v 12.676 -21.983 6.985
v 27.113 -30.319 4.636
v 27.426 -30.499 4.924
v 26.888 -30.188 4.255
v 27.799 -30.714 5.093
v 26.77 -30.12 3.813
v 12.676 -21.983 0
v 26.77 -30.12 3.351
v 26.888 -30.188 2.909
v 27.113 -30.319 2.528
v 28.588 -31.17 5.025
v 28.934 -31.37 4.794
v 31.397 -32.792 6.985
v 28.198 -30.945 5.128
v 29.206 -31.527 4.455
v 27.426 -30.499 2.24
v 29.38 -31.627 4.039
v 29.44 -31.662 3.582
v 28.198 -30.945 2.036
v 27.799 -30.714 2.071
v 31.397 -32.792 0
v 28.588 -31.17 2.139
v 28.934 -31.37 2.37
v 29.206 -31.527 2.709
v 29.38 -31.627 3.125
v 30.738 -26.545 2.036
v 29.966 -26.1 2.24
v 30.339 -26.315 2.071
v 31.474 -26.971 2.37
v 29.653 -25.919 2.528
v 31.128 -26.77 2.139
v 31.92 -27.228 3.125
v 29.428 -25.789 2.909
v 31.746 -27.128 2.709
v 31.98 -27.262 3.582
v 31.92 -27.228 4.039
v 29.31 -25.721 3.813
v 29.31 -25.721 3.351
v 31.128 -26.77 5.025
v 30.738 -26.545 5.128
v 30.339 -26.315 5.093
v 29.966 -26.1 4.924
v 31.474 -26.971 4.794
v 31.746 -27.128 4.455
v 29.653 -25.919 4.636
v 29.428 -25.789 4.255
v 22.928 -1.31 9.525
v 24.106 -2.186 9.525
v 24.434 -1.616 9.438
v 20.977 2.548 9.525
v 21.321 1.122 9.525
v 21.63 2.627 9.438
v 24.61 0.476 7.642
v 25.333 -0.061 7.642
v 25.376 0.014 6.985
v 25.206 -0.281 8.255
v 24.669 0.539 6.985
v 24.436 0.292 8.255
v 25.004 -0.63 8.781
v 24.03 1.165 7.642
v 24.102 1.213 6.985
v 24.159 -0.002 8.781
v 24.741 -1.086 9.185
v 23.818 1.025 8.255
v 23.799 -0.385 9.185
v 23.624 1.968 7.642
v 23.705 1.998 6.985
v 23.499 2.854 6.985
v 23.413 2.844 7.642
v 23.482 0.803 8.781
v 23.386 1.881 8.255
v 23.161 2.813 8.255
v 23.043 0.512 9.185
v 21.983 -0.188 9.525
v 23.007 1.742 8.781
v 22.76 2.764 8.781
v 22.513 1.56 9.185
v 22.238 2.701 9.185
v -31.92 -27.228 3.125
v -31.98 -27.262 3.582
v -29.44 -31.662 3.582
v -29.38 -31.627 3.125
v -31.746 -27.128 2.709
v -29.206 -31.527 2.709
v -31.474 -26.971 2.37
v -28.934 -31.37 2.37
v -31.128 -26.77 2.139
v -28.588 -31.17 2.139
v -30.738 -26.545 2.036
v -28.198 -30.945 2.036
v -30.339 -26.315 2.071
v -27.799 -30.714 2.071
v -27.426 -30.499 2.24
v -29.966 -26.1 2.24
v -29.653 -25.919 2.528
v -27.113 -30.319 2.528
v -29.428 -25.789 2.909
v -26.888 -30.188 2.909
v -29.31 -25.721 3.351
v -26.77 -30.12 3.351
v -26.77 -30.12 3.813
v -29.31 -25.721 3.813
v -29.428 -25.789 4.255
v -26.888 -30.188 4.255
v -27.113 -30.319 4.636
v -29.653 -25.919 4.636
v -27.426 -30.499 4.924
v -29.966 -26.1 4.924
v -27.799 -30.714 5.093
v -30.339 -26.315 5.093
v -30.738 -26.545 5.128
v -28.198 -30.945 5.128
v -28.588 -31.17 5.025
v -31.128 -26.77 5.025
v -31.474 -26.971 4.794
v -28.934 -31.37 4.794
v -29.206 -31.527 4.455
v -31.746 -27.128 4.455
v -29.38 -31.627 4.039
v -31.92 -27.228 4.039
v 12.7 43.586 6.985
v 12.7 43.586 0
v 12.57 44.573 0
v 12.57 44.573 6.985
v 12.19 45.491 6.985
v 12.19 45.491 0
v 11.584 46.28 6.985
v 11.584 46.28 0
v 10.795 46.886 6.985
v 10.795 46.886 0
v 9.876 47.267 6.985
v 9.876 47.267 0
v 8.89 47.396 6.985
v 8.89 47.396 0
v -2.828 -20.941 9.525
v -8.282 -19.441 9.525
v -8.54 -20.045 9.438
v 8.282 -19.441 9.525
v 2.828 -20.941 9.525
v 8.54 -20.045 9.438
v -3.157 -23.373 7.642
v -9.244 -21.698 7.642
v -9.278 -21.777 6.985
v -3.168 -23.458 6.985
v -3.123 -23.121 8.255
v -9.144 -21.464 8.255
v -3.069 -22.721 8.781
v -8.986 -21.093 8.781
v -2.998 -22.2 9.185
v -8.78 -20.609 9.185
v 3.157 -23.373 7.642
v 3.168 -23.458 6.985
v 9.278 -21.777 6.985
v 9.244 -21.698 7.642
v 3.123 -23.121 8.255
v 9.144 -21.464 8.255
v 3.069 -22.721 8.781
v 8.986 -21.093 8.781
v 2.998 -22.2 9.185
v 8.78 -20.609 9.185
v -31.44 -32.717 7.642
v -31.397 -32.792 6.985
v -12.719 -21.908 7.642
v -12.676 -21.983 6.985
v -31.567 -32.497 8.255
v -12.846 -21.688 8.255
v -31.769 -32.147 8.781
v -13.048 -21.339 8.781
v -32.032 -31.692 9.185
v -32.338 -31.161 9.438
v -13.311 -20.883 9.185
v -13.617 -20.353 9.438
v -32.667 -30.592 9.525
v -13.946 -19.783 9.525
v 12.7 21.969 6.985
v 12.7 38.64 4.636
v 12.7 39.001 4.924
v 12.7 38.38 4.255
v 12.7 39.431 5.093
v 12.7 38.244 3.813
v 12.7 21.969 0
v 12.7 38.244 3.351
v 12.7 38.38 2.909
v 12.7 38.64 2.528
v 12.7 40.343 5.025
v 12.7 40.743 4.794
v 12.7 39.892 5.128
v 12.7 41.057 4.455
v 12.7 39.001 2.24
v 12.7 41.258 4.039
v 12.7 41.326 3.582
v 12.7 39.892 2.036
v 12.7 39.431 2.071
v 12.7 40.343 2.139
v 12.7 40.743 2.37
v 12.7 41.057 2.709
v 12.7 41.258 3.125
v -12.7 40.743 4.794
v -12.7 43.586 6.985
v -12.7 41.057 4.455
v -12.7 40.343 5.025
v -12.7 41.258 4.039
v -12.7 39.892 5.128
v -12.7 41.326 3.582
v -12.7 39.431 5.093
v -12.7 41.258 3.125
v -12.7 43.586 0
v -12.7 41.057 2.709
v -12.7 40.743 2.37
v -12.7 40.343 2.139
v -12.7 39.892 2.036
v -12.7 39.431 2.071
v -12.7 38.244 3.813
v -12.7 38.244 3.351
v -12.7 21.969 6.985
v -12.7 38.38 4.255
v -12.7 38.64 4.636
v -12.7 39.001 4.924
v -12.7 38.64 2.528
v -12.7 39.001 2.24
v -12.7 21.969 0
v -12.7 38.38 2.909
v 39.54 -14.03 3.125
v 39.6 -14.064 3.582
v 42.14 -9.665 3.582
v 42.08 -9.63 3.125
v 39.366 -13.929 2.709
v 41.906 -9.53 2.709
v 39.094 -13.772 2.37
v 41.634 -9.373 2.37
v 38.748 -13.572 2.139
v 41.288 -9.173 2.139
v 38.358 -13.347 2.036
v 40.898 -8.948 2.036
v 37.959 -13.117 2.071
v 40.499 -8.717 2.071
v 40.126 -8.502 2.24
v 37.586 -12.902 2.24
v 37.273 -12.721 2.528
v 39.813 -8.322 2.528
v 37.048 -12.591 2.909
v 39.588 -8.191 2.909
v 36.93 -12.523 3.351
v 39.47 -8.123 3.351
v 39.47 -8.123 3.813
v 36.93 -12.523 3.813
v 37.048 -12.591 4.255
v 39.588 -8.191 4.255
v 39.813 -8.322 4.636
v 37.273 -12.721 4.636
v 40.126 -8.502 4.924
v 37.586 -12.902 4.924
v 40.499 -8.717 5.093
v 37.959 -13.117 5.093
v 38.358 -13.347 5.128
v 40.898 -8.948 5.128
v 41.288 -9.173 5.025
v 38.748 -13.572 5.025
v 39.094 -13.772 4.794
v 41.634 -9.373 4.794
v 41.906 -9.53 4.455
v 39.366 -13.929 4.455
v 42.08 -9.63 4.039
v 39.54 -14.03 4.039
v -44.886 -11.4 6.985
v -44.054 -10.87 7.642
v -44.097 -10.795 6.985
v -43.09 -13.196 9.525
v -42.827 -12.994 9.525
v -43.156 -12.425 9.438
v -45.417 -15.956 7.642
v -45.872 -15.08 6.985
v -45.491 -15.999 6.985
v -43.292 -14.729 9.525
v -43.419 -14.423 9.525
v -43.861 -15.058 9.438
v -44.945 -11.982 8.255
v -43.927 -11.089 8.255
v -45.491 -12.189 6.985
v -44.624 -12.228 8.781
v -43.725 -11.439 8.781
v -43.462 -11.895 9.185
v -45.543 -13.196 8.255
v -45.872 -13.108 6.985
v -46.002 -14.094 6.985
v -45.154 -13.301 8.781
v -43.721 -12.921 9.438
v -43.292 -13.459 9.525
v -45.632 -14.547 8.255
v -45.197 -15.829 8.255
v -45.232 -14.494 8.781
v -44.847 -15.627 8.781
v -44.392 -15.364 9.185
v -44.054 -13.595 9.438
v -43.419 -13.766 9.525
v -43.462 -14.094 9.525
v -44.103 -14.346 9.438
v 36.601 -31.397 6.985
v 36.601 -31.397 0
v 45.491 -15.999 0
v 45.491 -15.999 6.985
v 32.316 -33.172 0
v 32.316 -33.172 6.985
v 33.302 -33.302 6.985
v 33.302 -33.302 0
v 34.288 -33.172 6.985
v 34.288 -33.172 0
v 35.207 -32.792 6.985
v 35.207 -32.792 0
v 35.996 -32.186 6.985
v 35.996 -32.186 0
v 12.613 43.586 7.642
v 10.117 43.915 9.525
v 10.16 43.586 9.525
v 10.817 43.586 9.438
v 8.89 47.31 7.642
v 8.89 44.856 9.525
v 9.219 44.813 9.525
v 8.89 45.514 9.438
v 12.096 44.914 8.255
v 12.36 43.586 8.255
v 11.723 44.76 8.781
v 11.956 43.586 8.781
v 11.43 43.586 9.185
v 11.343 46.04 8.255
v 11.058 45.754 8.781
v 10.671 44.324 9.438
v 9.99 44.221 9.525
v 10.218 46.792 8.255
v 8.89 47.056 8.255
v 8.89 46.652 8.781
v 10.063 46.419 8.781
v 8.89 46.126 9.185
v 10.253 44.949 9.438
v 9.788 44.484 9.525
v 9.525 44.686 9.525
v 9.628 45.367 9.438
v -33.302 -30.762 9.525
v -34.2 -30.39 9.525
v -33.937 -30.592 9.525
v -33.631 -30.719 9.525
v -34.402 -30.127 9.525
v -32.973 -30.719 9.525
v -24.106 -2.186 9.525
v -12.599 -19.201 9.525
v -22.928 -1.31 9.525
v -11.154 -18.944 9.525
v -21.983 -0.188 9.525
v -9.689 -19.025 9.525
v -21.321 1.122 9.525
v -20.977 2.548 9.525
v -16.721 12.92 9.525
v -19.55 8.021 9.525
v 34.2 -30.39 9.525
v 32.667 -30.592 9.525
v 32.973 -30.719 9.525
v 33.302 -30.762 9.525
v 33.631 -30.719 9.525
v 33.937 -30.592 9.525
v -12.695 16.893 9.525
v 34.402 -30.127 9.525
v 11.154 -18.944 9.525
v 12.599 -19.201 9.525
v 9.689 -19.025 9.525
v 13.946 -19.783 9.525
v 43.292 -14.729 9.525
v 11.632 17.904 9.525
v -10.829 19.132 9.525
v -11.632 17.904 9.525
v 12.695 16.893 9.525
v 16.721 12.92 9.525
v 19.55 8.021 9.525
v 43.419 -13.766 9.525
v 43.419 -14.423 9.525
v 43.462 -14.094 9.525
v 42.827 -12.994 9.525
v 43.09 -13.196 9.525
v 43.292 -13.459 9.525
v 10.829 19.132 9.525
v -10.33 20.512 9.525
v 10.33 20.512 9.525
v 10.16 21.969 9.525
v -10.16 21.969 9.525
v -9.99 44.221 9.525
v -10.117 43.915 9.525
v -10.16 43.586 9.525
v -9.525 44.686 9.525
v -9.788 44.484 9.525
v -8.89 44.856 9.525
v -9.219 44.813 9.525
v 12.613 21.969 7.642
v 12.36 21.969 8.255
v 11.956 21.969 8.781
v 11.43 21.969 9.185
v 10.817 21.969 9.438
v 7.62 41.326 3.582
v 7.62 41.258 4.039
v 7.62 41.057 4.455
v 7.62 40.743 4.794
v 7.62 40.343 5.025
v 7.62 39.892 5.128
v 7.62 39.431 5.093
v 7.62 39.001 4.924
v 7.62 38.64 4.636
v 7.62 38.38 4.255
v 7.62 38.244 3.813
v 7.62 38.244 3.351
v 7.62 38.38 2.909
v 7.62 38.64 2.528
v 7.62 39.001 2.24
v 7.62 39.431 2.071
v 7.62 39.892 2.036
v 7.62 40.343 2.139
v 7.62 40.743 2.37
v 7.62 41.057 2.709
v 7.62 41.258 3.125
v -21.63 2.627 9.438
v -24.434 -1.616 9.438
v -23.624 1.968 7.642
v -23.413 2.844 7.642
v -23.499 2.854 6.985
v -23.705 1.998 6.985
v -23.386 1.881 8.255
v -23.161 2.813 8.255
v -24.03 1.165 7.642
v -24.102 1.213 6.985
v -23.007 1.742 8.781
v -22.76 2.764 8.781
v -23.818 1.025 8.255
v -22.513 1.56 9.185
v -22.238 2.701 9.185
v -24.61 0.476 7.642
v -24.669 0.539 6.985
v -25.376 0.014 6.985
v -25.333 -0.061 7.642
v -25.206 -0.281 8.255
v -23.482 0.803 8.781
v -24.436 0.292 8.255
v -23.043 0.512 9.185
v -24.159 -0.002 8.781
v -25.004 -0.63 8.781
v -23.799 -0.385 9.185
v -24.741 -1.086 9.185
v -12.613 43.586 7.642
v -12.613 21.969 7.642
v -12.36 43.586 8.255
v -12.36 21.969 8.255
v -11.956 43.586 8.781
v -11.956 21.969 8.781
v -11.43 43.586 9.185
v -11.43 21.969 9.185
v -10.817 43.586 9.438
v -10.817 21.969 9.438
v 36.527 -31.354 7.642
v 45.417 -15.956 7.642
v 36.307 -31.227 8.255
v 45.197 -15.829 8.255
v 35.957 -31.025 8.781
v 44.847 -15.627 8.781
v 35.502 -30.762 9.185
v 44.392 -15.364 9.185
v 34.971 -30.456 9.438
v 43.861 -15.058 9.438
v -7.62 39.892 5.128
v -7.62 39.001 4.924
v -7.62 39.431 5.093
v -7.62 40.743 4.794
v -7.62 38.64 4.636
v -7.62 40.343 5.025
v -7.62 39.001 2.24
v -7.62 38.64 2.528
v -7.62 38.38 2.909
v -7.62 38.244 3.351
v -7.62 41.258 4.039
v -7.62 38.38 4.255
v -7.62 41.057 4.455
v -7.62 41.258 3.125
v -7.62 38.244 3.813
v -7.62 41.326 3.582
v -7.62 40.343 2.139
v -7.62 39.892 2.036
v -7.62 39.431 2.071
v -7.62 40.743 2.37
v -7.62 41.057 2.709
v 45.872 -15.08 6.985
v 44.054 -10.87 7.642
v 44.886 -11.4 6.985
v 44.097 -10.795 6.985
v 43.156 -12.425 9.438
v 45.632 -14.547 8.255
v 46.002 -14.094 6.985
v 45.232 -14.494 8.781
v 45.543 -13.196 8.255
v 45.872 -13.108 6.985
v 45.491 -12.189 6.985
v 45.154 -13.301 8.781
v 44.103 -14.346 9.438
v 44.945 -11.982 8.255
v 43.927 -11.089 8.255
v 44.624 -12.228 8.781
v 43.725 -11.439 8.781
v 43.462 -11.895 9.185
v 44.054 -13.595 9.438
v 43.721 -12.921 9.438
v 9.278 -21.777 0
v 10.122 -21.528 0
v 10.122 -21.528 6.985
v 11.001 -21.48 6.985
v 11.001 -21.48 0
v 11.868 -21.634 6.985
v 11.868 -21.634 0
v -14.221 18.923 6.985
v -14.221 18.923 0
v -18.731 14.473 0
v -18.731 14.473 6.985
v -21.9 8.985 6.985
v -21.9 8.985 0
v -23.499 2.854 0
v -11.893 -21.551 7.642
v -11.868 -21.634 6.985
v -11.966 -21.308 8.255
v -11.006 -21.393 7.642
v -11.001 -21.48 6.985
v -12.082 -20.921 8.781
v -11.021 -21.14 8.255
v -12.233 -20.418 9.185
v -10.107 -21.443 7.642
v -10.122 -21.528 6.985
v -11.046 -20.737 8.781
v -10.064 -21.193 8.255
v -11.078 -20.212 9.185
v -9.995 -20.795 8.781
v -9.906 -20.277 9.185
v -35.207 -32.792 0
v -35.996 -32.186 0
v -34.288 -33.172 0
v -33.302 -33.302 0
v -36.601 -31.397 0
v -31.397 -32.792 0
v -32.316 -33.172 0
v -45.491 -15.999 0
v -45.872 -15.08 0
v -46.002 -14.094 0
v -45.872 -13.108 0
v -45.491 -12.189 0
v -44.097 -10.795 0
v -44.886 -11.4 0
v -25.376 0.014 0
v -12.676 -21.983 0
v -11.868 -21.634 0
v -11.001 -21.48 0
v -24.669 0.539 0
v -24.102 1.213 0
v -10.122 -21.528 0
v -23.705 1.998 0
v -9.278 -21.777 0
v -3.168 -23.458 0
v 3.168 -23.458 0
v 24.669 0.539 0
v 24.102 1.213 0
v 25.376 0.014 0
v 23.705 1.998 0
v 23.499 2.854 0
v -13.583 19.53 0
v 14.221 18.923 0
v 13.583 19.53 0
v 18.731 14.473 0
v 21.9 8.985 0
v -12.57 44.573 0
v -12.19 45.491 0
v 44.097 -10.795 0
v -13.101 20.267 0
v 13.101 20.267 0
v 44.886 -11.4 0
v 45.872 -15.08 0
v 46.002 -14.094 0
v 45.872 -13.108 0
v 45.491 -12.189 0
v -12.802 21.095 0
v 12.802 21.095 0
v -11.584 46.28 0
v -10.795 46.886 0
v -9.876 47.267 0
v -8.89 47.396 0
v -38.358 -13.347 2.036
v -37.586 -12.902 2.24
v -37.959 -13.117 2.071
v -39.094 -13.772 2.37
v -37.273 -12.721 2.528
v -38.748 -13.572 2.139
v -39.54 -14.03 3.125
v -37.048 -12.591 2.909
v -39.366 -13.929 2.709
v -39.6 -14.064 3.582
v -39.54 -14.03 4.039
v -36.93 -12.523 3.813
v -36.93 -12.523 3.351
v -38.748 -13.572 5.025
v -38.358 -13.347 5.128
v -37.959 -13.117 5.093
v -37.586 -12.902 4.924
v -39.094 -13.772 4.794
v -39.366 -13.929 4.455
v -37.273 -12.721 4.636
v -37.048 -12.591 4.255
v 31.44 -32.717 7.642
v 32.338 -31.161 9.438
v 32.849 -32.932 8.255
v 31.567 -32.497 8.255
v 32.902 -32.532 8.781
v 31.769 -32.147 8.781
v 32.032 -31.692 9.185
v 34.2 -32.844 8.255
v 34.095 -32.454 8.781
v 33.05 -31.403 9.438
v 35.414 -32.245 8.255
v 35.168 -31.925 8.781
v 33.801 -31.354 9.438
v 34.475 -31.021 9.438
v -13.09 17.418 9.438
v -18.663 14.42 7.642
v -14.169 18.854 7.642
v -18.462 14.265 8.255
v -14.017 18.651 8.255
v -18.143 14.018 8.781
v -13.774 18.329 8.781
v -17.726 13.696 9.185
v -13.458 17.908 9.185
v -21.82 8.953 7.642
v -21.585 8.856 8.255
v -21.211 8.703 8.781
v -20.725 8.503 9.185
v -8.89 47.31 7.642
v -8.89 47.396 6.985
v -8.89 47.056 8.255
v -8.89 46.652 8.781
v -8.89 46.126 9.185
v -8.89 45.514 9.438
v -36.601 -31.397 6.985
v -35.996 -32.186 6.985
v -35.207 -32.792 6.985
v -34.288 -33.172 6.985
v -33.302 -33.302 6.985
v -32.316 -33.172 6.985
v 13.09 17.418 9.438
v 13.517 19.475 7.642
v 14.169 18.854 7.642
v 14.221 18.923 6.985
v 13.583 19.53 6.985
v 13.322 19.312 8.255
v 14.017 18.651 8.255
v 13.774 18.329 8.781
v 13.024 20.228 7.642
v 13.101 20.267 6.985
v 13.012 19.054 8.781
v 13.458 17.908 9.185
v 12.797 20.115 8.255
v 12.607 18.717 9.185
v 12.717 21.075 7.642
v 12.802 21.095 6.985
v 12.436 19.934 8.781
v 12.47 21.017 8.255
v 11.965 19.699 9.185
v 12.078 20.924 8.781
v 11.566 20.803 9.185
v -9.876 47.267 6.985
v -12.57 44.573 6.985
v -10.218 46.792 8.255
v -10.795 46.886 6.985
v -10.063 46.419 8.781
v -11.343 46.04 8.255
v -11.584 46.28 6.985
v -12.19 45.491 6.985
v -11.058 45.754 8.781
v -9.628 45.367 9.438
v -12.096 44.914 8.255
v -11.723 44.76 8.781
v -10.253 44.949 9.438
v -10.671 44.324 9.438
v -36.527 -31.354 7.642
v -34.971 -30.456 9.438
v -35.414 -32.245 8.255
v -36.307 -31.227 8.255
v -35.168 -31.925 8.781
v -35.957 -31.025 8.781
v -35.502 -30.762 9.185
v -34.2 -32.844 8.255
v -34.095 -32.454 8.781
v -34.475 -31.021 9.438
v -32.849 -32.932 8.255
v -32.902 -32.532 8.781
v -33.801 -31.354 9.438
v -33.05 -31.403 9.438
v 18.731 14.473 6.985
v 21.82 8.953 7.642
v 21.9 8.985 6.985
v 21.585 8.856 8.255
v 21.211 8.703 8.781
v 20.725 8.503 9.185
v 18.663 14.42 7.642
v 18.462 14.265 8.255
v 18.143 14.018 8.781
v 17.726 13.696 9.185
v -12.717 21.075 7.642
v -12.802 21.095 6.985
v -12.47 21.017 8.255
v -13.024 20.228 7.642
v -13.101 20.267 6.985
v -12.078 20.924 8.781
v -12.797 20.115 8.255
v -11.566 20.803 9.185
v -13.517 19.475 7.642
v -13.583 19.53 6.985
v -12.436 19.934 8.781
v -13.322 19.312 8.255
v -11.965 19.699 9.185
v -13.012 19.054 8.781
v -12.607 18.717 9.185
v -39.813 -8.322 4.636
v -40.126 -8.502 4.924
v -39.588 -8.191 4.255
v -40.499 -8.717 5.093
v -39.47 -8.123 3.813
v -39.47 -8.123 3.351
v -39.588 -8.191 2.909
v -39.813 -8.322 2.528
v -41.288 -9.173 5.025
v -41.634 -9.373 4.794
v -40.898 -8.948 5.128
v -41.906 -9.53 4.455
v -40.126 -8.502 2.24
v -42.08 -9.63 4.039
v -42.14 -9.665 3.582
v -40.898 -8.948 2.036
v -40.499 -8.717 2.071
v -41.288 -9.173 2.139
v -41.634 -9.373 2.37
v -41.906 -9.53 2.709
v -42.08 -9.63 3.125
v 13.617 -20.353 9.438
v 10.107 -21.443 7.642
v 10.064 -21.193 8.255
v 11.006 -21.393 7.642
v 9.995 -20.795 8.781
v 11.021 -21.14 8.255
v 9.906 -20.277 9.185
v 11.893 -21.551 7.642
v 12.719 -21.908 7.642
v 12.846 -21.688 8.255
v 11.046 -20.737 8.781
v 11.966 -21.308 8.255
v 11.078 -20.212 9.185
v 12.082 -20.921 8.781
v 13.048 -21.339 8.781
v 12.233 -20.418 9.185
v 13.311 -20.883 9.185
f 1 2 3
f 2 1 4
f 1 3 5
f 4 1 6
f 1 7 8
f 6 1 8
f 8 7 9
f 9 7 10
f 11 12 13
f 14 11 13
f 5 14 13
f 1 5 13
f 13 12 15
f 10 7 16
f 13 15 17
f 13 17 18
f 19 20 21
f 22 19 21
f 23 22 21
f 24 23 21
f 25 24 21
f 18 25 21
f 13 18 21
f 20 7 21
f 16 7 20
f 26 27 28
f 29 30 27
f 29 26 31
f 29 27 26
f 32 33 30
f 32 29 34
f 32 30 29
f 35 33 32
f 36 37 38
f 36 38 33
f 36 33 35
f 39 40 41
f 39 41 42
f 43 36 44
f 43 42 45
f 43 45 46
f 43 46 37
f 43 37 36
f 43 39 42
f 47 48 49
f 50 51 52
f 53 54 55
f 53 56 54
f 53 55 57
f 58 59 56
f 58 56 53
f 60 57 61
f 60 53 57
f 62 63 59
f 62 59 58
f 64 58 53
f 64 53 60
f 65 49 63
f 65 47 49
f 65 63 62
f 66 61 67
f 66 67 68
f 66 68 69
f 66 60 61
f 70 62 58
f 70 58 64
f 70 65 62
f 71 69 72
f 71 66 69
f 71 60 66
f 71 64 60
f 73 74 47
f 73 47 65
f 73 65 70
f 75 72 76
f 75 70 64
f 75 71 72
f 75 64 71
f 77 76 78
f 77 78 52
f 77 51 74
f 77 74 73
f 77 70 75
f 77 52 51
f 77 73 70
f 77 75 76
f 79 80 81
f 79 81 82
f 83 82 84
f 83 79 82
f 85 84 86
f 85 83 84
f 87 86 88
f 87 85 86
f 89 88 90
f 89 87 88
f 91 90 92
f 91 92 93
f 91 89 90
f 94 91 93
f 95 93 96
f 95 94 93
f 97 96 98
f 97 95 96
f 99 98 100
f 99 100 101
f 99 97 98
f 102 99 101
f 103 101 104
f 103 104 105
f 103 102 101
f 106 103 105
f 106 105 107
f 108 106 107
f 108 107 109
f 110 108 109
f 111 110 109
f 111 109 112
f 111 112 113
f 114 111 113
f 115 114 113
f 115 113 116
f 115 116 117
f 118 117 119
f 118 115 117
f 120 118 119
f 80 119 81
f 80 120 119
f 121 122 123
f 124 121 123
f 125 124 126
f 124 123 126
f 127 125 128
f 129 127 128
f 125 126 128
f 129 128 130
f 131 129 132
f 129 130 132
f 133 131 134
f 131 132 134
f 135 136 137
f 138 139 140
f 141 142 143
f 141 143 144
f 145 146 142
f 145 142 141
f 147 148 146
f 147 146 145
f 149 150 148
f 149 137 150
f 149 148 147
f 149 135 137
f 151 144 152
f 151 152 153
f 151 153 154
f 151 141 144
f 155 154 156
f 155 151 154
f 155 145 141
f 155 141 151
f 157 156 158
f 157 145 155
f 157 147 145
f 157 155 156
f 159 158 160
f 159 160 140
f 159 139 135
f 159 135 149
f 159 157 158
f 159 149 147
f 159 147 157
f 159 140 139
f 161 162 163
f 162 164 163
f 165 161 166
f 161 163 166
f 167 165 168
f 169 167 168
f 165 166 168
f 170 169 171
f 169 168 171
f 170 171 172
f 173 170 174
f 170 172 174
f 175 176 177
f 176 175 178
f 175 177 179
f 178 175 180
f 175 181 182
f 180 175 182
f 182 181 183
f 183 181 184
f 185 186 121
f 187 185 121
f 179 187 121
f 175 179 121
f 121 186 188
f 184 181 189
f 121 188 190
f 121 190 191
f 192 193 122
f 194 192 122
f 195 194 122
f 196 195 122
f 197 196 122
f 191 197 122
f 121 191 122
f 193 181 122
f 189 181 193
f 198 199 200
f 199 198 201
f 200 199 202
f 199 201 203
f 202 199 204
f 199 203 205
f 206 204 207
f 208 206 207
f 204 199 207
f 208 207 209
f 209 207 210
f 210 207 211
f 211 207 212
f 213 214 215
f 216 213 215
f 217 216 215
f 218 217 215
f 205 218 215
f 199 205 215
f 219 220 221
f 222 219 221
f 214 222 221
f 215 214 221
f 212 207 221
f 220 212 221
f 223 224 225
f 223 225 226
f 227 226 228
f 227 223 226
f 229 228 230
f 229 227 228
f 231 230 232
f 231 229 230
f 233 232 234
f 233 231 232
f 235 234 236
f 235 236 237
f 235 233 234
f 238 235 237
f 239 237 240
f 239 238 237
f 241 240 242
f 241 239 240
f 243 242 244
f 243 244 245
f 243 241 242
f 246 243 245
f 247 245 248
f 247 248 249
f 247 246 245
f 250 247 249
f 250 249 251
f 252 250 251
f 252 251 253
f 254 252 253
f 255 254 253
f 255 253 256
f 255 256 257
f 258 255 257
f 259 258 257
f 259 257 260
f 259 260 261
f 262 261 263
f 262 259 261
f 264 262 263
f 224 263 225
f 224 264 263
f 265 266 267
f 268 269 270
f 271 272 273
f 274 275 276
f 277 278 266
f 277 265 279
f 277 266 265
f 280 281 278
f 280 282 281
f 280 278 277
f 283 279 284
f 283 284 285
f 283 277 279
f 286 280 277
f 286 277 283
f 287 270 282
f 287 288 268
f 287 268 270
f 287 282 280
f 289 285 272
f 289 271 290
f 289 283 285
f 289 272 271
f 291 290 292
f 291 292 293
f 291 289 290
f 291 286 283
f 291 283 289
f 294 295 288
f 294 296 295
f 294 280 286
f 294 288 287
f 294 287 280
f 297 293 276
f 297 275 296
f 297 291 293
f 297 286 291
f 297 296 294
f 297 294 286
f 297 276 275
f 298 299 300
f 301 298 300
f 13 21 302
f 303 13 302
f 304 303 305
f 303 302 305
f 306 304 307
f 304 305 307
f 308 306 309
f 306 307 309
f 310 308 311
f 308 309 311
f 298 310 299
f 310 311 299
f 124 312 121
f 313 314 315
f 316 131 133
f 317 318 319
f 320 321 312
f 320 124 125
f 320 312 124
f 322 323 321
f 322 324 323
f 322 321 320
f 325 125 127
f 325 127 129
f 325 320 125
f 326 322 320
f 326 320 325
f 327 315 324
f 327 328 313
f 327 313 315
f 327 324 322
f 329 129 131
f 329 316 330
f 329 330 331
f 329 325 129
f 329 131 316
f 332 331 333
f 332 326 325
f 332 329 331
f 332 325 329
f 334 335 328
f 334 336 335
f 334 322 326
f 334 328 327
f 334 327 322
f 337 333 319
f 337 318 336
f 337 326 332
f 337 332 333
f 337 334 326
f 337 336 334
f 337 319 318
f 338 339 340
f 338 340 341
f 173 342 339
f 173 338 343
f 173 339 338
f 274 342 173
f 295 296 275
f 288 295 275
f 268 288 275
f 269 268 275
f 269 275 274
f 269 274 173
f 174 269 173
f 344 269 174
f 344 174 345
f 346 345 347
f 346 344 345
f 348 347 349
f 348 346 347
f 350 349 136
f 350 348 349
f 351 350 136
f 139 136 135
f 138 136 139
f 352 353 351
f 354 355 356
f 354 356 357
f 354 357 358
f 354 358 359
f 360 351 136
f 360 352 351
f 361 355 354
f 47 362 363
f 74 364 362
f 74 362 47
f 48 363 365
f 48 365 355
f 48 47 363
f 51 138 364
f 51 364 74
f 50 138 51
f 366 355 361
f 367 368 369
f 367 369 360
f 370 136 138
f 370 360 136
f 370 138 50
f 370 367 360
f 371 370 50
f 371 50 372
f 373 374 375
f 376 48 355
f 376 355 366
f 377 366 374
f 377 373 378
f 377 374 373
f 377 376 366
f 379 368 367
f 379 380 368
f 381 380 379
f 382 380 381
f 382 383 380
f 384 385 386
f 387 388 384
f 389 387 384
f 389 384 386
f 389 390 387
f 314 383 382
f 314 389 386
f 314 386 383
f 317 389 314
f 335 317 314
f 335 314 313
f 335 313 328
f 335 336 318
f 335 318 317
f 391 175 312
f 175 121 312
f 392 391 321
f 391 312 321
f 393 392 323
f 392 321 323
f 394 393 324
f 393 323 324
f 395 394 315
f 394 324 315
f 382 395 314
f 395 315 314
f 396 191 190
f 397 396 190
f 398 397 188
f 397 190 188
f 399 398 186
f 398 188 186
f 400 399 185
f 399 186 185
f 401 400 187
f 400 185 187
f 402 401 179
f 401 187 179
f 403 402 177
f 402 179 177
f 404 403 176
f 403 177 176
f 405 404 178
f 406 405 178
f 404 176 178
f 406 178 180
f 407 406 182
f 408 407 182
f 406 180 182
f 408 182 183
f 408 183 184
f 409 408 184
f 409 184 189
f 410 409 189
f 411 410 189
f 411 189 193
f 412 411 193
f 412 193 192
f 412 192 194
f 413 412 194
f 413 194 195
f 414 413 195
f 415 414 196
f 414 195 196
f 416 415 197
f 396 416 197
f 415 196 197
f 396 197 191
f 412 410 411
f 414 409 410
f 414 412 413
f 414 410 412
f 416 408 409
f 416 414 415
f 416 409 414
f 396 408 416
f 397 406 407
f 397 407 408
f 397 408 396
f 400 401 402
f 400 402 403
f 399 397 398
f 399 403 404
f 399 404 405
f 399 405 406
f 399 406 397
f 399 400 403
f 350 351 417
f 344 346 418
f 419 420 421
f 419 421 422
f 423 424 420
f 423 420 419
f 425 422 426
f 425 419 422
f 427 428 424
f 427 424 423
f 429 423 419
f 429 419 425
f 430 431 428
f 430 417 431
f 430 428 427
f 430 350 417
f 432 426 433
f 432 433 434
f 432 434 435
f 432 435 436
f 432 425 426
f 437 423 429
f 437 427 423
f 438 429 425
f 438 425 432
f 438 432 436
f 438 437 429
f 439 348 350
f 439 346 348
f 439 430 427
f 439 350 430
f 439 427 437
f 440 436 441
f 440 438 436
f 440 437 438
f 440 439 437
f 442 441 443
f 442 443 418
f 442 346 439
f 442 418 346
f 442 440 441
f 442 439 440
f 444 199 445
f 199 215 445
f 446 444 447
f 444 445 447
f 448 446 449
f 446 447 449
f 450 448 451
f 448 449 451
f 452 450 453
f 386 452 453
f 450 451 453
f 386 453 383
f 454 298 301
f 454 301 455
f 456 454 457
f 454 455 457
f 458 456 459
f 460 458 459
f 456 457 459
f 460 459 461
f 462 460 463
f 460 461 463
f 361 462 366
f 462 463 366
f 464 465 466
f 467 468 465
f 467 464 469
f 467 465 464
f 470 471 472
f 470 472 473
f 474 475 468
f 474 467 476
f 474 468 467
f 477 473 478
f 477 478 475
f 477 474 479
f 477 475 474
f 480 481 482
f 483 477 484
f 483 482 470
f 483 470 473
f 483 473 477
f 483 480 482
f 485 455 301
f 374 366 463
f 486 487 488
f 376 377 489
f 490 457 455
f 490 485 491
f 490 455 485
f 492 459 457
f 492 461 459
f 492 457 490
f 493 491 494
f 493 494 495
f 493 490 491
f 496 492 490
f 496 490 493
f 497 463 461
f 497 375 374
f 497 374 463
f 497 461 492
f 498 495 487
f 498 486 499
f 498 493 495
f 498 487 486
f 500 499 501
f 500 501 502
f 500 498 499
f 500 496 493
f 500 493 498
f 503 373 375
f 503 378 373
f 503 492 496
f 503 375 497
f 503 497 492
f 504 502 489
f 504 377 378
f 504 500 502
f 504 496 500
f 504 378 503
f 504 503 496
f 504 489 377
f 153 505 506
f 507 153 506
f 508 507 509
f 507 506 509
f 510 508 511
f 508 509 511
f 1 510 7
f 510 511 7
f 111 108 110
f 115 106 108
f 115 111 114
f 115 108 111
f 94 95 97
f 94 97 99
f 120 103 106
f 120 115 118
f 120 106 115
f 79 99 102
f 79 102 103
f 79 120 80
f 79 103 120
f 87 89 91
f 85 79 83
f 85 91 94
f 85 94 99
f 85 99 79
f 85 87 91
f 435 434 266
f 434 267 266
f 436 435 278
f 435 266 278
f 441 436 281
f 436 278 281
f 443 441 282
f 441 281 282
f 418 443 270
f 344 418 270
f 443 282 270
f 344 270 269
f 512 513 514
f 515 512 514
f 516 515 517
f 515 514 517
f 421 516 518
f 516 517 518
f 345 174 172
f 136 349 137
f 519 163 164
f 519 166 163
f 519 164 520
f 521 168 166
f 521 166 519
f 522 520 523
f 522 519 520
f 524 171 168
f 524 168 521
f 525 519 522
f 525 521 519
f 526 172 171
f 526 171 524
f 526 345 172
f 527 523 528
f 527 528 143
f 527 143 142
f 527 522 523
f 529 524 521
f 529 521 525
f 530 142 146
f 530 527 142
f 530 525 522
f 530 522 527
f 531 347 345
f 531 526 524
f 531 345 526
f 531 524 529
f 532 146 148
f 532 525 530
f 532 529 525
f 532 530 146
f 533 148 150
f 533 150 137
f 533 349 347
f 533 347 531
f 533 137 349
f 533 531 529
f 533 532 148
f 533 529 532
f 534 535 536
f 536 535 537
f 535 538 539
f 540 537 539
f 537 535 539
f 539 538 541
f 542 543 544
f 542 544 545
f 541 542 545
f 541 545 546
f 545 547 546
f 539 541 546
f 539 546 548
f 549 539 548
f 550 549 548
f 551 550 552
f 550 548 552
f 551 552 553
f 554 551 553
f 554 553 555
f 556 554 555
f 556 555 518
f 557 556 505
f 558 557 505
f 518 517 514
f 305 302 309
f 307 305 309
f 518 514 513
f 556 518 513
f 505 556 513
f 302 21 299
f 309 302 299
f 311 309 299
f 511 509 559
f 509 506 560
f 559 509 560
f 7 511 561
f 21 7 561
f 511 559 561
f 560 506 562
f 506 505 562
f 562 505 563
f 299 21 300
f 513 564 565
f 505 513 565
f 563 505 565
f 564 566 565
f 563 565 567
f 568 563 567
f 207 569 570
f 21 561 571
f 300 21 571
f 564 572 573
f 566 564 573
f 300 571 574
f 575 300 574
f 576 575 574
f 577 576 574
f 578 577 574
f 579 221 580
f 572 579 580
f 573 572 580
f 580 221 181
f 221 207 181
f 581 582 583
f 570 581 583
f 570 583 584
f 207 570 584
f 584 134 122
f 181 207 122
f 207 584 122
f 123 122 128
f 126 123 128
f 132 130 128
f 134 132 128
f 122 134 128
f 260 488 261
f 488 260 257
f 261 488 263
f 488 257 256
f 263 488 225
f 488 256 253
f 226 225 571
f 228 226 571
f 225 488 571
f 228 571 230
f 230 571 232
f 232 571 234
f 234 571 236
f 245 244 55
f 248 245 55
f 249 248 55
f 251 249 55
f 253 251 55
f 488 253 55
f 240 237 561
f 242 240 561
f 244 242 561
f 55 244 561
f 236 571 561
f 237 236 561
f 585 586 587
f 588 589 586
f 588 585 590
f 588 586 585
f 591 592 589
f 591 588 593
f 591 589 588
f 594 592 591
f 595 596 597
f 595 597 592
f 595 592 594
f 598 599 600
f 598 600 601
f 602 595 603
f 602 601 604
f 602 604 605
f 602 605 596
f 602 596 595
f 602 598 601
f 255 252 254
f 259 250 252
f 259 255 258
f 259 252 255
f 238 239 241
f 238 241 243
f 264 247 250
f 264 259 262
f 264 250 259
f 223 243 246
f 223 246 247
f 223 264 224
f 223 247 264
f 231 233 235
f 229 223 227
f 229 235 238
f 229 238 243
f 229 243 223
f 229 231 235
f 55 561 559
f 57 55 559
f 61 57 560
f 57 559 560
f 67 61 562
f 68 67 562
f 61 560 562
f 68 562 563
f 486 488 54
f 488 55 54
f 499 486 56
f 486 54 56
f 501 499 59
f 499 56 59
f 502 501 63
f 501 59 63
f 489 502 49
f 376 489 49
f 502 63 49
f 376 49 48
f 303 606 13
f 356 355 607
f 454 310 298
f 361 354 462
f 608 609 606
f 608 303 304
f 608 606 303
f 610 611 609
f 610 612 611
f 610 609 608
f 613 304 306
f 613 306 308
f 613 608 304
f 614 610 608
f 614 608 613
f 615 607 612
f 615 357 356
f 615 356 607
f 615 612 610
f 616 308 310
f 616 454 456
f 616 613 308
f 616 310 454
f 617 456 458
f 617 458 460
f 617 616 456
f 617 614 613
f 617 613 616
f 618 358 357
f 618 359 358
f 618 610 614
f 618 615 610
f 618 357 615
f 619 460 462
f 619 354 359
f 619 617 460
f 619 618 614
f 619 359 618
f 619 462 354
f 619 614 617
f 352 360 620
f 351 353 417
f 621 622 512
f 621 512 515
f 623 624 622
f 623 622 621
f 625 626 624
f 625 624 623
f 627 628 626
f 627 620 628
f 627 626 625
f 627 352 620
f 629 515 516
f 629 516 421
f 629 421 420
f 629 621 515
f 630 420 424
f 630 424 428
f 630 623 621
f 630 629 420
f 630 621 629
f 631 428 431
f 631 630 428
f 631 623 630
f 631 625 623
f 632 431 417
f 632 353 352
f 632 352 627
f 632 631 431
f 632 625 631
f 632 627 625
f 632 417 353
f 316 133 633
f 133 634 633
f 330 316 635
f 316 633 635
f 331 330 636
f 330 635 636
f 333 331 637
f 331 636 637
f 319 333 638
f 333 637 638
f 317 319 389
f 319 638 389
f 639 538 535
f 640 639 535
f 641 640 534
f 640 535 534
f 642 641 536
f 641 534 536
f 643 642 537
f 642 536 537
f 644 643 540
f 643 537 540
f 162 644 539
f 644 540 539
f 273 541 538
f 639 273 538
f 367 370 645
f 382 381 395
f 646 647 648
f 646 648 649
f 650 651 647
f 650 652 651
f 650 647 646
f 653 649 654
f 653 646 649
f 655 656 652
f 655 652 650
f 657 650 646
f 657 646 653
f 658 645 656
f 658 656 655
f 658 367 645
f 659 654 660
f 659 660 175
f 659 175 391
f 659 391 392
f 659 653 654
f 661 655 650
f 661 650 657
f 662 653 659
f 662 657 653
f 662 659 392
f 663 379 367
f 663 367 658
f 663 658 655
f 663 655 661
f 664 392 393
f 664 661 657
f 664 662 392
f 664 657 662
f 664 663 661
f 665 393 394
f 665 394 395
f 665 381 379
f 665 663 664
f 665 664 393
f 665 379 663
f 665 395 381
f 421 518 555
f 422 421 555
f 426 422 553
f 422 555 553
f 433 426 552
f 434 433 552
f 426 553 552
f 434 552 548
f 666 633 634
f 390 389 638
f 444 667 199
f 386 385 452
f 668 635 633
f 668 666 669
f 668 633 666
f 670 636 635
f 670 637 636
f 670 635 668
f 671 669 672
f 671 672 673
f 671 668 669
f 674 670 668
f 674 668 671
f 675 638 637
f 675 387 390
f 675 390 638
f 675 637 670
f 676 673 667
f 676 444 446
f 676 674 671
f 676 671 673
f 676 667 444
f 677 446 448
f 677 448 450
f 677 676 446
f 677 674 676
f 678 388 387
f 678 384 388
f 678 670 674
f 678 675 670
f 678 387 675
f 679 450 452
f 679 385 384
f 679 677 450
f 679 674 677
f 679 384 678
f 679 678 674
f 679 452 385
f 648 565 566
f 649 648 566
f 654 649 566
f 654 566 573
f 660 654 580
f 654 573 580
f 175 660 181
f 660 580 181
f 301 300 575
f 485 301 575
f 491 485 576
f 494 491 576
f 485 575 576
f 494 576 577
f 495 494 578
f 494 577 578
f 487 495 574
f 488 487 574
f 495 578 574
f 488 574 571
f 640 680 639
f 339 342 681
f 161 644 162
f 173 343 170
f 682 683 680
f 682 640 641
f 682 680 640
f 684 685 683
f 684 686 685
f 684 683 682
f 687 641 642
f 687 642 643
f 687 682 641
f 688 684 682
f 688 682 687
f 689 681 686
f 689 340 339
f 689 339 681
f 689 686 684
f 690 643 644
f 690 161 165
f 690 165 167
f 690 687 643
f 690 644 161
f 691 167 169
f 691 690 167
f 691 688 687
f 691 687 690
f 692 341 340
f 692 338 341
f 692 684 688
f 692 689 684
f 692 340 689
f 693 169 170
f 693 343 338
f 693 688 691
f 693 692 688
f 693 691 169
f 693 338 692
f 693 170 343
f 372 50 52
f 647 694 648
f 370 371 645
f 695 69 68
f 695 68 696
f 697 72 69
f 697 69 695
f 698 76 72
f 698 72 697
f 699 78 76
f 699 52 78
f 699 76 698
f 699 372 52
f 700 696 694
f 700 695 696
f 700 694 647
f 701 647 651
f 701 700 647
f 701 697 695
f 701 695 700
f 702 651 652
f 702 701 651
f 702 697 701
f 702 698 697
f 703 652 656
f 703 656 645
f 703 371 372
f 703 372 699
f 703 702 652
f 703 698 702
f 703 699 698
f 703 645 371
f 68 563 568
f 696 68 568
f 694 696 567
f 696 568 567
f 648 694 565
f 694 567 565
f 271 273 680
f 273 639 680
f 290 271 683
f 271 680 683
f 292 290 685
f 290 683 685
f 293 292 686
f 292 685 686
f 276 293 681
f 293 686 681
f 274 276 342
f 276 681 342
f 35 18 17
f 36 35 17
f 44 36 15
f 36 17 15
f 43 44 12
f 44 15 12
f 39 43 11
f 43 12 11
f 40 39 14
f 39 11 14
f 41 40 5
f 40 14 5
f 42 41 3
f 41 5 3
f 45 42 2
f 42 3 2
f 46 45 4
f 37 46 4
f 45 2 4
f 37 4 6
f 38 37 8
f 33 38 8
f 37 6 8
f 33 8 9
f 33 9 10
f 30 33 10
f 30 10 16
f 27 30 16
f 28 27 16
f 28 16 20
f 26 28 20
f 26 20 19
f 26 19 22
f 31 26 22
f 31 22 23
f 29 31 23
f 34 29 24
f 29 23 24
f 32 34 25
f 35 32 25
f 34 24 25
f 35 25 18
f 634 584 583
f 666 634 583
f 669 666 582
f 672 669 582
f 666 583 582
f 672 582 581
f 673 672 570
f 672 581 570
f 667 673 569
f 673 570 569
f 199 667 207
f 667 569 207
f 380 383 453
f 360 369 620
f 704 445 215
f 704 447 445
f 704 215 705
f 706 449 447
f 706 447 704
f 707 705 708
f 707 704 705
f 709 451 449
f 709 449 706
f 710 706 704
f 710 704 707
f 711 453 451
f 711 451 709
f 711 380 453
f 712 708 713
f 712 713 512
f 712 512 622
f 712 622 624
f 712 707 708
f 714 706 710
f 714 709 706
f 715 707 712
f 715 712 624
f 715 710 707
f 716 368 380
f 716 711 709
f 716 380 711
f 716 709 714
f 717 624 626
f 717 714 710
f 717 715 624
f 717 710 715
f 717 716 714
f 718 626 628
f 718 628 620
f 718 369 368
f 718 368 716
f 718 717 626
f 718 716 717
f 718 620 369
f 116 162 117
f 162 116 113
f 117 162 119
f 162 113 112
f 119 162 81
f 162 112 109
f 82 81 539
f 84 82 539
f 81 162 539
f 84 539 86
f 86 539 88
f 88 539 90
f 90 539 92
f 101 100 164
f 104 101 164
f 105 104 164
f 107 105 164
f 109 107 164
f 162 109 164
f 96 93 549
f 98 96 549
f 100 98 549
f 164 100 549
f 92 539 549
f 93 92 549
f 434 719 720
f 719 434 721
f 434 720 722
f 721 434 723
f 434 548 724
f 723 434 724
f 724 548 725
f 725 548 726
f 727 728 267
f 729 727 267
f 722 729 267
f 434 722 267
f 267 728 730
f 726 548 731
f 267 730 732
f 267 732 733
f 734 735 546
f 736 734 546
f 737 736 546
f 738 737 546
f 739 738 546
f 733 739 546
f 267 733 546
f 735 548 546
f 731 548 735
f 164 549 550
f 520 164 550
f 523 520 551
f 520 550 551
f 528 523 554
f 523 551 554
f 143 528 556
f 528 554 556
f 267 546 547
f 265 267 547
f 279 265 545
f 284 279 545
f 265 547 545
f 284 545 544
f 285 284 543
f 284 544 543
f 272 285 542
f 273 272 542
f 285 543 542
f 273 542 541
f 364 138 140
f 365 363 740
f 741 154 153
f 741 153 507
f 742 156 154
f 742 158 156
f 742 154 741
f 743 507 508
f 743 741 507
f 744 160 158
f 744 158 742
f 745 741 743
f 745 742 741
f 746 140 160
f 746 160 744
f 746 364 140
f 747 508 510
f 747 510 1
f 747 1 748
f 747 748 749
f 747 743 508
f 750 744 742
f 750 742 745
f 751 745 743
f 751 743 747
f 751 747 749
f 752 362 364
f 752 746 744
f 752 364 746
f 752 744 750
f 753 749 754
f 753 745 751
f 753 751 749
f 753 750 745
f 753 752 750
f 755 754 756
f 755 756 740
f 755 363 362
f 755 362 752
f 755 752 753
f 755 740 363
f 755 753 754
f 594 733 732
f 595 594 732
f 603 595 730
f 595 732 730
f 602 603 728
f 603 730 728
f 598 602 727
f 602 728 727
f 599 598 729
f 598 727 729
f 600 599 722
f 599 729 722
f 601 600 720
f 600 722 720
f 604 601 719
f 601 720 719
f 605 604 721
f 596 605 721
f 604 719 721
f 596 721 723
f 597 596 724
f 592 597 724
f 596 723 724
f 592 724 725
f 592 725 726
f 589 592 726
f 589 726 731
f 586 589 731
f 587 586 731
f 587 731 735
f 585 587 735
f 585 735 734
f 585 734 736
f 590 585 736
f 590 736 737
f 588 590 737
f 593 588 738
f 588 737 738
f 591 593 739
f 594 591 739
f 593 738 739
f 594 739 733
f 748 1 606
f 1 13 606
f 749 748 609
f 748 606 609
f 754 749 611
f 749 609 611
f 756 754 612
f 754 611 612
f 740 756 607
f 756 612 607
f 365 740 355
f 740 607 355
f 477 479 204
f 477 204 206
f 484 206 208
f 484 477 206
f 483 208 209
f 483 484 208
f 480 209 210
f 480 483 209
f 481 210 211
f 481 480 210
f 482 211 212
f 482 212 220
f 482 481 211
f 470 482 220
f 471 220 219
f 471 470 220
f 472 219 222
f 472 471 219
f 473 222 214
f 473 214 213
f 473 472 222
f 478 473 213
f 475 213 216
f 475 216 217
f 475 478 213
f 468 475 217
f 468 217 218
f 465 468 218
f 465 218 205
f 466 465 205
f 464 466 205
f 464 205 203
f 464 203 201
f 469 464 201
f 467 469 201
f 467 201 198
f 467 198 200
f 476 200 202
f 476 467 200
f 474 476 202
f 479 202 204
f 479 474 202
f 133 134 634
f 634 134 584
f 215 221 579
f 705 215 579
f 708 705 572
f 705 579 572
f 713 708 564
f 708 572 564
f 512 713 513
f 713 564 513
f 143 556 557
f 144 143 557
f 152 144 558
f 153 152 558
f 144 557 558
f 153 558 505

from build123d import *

# Parameters (mm, degrees)
BOSS_EXTRUDE1_DEPTH = 9.525
FILLET1_R           = 2.54
SKETCH3_R           = 1.55
CUT_EXTRUDE2_DEPTH  = 5.08
CUT_EXTRUDE3_START  = -5.08
SKETCH4_R           = 1.55
CUT_EXTRUDE3_DEPTH  = 5.08
CIRPATTERN2_COUNT   = 3


with BuildPart() as part:
    # Sketch1 → Boss-Extrude1 (new body)
    with BuildSketch(Plane.XY):
        with BuildLine():
            Line((12.7, 21.969079793), (12.7, 43.5864))
            ThreePointArc((12.7, 43.5864), (11.584076836, 46.280476836), (8.89, 47.3964))
            Line((8.89, 47.3964), (-8.89, 47.3964))
            ThreePointArc((-8.89, 47.3964), (-11.584076836, 46.280476836), (-12.7, 43.5864))
            Line((-12.7, 43.5864), (-12.7, 21.969079793))
            ThreePointArc((-12.7, 21.969079793), (-13.101409662, 20.266842468), (-14.221056121, 18.923289925))
            ThreePointArc((-14.221056121, 18.923289925), (-20.499926929, 11.835638331), (-23.498577859, 2.854150907))
            ThreePointArc((-23.498577859, 2.854150907), (-24.102305263, 1.212732359), (-25.375781199, 0.013982731))
            Line((-25.375781199, 0.013982731), (-44.09692966, -10.794677372))
            ThreePointArc((-44.09692966, -10.794677372), (-45.872107058, -13.108133599), (-45.491486448, -15.99923416))
            Line((-45.491486448, -15.99923416), (-36.601486448, -31.39716584))
            ThreePointArc((-36.601486448, -31.39716584), (-34.288030221, -33.172343238), (-31.39692966, -32.791722628))
            Line((-31.39692966, -32.791722628), (-12.675781199, -21.983062525))
            ThreePointArc((-12.675781199, -21.983062525), (-11.000895601, -21.479574827), (-9.277521738, -21.777440832))
            ThreePointArc((-9.277521738, -21.777440832), (0, -23.671276662), (9.277521738, -21.777440832))
            ThreePointArc((9.277521738, -21.777440832), (11.000895601, -21.479574827), (12.675781199, -21.983062525))
            Line((12.675781199, -21.983062525), (31.39692966, -32.791722628))
            ThreePointArc((31.39692966, -32.791722628), (34.288030221, -33.172343238), (36.601486448, -31.39716584))
            Line((36.601486448, -31.39716584), (45.491486448, -15.99923416))
            ThreePointArc((45.491486448, -15.99923416), (45.872107058, -13.108133599), (44.09692966, -10.794677372))
            Line((44.09692966, -10.794677372), (25.375781199, 0.013982731))
            ThreePointArc((25.375781199, 0.013982731), (24.102305263, 1.212732359), (23.498577859, 2.854150907))
            ThreePointArc((23.498577859, 2.854150907), (20.499926929, 11.835638331), (14.221056121, 18.923289925))
            ThreePointArc((14.221056121, 18.923289925), (13.101409662, 20.266842468), (12.7, 21.969079793))
        make_face()
    extrude(amount=BOSS_EXTRUDE1_DEPTH)

    # Fillet1
    fillet1_edges = [part.edges().sort_by_distance(p)[0] for p in [
        (-11.584076836, 46.280476836, 9.525),
        (0, 47.3964, 9.525),
        (11.584076836, 46.280476836, 9.525),
        (12.7, 32.777739897, 9.525),
        (13.101409662, 20.266842468, 9.525),
        (20.499926929, 11.835638331, 9.525),
        (24.102305263, 1.212732359, 9.525),
        (34.736355429, -5.39034732, 9.525),
        (45.872107058, -13.108133599, 9.525),
        (41.046486448, -23.6982, 9.525),
        (34.288030221, -33.172343238, 9.525),
        (22.036355429, -27.387392576, 9.525),
        (11.000895601, -21.479574827, 9.525),
        (0, -23.671276662, 9.525),
        (-11.000895601, -21.479574827, 9.525),
        (-22.036355429, -27.387392576, 9.525),
        (-34.288030221, -33.172343238, 9.525),
        (-41.046486448, -23.6982, 9.525),
        (-45.872107058, -13.108133599, 9.525),
        (-34.736355429, -5.39034732, 9.525),
        (-24.102305263, 1.212732359, 9.525),
        (-20.499926929, 11.835638331, 9.525),
        (-13.101409662, 20.266842468, 9.525),
        (-12.7, 32.777739897, 9.525),
    ]]
    fillet(fillet1_edges, radius=FILLET1_R)

    # Sketch3 → Cut-Extrude2 (cut)
    with BuildSketch(Plane(origin=(-6.35, -10.998522628, 0), x_dir=(0.8660254037844575, -0.4999999999999674, 0), z_dir=(-0.4999999999999675, -0.8660254037844576, 0))):
        with Locations((39.7764, 3.582)):
            Circle(SKETCH3_R)
    cut_extrude2 = extrude(amount=-CUT_EXTRUDE2_DEPTH, mode=Mode.SUBTRACT)

    # Sketch4 → Cut-Extrude3 (cut)
    with BuildSketch(Plane(origin=(6.35, 10.998522628, 0), x_dir=(0.8660254037844387, -0.49999999999999983, 0), z_dir=(0.49999999999999983, 0.8660254037844387, 0)).offset(CUT_EXTRUDE3_START)):
        with Locations((39.7764, -3.582)):
            Circle(SKETCH4_R)
    cut_extrude3 = extrude(amount=CUT_EXTRUDE3_DEPTH, mode=Mode.SUBTRACT)

    # CirPattern2: Cut-Extrude2, Cut-Extrude3 ×3 about axis
    cirpattern2_axis = Axis((0, 0, 0), (0, 0, -1))
    add([cut_extrude2.rotate(cirpattern2_axis, i * 360 / CIRPATTERN2_COUNT) for i in range(1, CIRPATTERN2_COUNT)], mode=Mode.SUBTRACT)
    add([cut_extrude3.rotate(cirpattern2_axis, i * 360 / CIRPATTERN2_COUNT) for i in range(1, CIRPATTERN2_COUNT)], mode=Mode.SUBTRACT)


solid = part.part
